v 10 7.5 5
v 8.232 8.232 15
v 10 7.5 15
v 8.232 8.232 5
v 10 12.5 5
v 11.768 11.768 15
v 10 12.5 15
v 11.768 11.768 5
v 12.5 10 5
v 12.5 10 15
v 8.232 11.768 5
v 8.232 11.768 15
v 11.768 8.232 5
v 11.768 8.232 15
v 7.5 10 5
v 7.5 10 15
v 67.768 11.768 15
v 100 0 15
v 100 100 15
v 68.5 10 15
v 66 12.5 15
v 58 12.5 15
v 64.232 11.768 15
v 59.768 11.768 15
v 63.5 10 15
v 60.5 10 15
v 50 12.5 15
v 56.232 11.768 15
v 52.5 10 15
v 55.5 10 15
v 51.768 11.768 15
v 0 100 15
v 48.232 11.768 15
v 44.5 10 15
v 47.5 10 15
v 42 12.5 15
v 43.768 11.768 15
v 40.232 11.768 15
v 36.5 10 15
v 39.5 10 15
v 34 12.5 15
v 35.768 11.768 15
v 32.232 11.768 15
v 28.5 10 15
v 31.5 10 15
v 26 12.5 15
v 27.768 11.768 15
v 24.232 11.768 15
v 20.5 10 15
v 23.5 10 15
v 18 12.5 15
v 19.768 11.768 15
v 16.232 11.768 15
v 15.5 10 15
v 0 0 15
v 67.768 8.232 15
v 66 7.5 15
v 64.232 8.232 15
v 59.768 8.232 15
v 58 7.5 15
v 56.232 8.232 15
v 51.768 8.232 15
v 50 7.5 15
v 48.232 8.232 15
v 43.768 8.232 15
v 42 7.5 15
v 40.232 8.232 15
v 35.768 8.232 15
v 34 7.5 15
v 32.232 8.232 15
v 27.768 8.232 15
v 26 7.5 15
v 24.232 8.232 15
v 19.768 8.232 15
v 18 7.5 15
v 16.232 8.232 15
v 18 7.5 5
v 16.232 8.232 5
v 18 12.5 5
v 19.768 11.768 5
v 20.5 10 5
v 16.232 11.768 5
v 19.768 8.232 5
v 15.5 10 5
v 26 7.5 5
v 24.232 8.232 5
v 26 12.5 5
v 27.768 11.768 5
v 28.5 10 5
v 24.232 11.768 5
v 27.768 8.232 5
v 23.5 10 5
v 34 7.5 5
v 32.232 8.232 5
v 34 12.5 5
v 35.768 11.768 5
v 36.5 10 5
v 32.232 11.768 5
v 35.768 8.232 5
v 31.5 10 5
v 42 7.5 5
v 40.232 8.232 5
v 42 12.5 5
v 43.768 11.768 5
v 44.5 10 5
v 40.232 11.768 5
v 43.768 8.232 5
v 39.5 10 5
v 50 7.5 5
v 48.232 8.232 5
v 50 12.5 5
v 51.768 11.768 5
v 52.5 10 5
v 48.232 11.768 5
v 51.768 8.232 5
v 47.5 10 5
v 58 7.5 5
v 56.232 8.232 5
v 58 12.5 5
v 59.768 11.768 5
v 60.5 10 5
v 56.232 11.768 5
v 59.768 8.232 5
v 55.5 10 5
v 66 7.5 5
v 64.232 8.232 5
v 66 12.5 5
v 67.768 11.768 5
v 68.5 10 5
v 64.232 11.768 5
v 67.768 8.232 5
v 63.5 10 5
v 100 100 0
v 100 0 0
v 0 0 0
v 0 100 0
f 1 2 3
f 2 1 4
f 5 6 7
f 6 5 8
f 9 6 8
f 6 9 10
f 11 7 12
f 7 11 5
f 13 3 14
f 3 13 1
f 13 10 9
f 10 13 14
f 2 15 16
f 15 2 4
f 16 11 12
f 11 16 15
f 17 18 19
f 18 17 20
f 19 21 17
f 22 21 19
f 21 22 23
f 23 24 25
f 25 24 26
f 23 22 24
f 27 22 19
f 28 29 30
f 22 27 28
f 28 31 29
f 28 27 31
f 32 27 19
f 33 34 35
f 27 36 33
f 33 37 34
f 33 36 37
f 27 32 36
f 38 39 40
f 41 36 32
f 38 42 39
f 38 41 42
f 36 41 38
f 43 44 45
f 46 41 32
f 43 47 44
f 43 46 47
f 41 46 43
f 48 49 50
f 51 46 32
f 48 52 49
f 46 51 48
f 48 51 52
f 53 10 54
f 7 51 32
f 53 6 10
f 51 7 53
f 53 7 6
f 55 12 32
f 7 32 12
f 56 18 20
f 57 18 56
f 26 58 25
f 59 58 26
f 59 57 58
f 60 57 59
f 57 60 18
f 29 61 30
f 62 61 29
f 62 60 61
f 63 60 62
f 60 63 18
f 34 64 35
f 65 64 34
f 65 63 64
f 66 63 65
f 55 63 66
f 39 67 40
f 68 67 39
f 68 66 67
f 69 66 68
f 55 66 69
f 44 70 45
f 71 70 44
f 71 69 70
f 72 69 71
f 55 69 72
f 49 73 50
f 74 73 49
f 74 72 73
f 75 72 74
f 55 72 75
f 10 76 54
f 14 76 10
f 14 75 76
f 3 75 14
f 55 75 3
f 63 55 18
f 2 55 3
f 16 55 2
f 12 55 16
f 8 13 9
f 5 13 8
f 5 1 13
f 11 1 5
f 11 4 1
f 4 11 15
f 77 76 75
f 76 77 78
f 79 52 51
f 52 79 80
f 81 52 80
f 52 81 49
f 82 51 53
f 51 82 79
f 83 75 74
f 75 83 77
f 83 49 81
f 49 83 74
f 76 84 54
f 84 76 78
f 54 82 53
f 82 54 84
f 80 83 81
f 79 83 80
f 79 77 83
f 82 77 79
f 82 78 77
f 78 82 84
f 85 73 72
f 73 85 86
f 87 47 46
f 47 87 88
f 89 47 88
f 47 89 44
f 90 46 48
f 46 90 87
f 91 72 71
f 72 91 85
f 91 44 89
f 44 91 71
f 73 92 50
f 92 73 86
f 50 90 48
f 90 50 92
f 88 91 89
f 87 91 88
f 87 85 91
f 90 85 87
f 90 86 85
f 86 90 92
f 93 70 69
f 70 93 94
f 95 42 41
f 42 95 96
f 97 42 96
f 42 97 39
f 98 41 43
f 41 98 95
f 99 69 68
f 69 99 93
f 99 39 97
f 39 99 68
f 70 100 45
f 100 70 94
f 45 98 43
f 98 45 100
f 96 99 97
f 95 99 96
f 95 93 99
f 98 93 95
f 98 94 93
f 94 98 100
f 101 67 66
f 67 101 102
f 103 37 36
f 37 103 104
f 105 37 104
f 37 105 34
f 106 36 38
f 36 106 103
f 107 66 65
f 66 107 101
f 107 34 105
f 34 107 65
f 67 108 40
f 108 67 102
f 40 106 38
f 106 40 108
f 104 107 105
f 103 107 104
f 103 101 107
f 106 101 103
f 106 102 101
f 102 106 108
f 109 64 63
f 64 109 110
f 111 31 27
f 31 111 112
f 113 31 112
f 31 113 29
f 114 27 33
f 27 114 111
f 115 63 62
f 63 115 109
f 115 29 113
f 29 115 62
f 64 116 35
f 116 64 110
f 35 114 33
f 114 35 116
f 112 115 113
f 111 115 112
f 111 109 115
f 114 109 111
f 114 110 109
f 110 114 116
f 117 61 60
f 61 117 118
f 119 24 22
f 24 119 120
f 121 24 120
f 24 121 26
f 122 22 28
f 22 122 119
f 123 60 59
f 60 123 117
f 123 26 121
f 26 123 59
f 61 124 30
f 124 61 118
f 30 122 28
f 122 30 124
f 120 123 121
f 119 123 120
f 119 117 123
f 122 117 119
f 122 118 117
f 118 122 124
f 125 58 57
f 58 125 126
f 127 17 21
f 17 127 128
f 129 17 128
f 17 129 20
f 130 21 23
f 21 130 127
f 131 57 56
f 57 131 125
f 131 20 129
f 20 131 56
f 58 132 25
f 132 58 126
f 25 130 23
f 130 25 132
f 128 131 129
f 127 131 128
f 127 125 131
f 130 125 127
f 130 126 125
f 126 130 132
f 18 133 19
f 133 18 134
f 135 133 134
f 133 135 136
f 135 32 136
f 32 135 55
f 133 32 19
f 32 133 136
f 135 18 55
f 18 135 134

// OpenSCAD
length=100;
width=100;
height=15;
hole_depth = 10;
hole_diameter = 5;
holes=[8,8];
frame=10;

difference() {
    cube([length,width,height]);
    for (x = [0:holes[0]-1]) {
        translate([frame+holes[0]*x,frame,height-hole_depth]) {
            cylinder(h=hole_depth, d=hole_diameter);
        }
    }
}
